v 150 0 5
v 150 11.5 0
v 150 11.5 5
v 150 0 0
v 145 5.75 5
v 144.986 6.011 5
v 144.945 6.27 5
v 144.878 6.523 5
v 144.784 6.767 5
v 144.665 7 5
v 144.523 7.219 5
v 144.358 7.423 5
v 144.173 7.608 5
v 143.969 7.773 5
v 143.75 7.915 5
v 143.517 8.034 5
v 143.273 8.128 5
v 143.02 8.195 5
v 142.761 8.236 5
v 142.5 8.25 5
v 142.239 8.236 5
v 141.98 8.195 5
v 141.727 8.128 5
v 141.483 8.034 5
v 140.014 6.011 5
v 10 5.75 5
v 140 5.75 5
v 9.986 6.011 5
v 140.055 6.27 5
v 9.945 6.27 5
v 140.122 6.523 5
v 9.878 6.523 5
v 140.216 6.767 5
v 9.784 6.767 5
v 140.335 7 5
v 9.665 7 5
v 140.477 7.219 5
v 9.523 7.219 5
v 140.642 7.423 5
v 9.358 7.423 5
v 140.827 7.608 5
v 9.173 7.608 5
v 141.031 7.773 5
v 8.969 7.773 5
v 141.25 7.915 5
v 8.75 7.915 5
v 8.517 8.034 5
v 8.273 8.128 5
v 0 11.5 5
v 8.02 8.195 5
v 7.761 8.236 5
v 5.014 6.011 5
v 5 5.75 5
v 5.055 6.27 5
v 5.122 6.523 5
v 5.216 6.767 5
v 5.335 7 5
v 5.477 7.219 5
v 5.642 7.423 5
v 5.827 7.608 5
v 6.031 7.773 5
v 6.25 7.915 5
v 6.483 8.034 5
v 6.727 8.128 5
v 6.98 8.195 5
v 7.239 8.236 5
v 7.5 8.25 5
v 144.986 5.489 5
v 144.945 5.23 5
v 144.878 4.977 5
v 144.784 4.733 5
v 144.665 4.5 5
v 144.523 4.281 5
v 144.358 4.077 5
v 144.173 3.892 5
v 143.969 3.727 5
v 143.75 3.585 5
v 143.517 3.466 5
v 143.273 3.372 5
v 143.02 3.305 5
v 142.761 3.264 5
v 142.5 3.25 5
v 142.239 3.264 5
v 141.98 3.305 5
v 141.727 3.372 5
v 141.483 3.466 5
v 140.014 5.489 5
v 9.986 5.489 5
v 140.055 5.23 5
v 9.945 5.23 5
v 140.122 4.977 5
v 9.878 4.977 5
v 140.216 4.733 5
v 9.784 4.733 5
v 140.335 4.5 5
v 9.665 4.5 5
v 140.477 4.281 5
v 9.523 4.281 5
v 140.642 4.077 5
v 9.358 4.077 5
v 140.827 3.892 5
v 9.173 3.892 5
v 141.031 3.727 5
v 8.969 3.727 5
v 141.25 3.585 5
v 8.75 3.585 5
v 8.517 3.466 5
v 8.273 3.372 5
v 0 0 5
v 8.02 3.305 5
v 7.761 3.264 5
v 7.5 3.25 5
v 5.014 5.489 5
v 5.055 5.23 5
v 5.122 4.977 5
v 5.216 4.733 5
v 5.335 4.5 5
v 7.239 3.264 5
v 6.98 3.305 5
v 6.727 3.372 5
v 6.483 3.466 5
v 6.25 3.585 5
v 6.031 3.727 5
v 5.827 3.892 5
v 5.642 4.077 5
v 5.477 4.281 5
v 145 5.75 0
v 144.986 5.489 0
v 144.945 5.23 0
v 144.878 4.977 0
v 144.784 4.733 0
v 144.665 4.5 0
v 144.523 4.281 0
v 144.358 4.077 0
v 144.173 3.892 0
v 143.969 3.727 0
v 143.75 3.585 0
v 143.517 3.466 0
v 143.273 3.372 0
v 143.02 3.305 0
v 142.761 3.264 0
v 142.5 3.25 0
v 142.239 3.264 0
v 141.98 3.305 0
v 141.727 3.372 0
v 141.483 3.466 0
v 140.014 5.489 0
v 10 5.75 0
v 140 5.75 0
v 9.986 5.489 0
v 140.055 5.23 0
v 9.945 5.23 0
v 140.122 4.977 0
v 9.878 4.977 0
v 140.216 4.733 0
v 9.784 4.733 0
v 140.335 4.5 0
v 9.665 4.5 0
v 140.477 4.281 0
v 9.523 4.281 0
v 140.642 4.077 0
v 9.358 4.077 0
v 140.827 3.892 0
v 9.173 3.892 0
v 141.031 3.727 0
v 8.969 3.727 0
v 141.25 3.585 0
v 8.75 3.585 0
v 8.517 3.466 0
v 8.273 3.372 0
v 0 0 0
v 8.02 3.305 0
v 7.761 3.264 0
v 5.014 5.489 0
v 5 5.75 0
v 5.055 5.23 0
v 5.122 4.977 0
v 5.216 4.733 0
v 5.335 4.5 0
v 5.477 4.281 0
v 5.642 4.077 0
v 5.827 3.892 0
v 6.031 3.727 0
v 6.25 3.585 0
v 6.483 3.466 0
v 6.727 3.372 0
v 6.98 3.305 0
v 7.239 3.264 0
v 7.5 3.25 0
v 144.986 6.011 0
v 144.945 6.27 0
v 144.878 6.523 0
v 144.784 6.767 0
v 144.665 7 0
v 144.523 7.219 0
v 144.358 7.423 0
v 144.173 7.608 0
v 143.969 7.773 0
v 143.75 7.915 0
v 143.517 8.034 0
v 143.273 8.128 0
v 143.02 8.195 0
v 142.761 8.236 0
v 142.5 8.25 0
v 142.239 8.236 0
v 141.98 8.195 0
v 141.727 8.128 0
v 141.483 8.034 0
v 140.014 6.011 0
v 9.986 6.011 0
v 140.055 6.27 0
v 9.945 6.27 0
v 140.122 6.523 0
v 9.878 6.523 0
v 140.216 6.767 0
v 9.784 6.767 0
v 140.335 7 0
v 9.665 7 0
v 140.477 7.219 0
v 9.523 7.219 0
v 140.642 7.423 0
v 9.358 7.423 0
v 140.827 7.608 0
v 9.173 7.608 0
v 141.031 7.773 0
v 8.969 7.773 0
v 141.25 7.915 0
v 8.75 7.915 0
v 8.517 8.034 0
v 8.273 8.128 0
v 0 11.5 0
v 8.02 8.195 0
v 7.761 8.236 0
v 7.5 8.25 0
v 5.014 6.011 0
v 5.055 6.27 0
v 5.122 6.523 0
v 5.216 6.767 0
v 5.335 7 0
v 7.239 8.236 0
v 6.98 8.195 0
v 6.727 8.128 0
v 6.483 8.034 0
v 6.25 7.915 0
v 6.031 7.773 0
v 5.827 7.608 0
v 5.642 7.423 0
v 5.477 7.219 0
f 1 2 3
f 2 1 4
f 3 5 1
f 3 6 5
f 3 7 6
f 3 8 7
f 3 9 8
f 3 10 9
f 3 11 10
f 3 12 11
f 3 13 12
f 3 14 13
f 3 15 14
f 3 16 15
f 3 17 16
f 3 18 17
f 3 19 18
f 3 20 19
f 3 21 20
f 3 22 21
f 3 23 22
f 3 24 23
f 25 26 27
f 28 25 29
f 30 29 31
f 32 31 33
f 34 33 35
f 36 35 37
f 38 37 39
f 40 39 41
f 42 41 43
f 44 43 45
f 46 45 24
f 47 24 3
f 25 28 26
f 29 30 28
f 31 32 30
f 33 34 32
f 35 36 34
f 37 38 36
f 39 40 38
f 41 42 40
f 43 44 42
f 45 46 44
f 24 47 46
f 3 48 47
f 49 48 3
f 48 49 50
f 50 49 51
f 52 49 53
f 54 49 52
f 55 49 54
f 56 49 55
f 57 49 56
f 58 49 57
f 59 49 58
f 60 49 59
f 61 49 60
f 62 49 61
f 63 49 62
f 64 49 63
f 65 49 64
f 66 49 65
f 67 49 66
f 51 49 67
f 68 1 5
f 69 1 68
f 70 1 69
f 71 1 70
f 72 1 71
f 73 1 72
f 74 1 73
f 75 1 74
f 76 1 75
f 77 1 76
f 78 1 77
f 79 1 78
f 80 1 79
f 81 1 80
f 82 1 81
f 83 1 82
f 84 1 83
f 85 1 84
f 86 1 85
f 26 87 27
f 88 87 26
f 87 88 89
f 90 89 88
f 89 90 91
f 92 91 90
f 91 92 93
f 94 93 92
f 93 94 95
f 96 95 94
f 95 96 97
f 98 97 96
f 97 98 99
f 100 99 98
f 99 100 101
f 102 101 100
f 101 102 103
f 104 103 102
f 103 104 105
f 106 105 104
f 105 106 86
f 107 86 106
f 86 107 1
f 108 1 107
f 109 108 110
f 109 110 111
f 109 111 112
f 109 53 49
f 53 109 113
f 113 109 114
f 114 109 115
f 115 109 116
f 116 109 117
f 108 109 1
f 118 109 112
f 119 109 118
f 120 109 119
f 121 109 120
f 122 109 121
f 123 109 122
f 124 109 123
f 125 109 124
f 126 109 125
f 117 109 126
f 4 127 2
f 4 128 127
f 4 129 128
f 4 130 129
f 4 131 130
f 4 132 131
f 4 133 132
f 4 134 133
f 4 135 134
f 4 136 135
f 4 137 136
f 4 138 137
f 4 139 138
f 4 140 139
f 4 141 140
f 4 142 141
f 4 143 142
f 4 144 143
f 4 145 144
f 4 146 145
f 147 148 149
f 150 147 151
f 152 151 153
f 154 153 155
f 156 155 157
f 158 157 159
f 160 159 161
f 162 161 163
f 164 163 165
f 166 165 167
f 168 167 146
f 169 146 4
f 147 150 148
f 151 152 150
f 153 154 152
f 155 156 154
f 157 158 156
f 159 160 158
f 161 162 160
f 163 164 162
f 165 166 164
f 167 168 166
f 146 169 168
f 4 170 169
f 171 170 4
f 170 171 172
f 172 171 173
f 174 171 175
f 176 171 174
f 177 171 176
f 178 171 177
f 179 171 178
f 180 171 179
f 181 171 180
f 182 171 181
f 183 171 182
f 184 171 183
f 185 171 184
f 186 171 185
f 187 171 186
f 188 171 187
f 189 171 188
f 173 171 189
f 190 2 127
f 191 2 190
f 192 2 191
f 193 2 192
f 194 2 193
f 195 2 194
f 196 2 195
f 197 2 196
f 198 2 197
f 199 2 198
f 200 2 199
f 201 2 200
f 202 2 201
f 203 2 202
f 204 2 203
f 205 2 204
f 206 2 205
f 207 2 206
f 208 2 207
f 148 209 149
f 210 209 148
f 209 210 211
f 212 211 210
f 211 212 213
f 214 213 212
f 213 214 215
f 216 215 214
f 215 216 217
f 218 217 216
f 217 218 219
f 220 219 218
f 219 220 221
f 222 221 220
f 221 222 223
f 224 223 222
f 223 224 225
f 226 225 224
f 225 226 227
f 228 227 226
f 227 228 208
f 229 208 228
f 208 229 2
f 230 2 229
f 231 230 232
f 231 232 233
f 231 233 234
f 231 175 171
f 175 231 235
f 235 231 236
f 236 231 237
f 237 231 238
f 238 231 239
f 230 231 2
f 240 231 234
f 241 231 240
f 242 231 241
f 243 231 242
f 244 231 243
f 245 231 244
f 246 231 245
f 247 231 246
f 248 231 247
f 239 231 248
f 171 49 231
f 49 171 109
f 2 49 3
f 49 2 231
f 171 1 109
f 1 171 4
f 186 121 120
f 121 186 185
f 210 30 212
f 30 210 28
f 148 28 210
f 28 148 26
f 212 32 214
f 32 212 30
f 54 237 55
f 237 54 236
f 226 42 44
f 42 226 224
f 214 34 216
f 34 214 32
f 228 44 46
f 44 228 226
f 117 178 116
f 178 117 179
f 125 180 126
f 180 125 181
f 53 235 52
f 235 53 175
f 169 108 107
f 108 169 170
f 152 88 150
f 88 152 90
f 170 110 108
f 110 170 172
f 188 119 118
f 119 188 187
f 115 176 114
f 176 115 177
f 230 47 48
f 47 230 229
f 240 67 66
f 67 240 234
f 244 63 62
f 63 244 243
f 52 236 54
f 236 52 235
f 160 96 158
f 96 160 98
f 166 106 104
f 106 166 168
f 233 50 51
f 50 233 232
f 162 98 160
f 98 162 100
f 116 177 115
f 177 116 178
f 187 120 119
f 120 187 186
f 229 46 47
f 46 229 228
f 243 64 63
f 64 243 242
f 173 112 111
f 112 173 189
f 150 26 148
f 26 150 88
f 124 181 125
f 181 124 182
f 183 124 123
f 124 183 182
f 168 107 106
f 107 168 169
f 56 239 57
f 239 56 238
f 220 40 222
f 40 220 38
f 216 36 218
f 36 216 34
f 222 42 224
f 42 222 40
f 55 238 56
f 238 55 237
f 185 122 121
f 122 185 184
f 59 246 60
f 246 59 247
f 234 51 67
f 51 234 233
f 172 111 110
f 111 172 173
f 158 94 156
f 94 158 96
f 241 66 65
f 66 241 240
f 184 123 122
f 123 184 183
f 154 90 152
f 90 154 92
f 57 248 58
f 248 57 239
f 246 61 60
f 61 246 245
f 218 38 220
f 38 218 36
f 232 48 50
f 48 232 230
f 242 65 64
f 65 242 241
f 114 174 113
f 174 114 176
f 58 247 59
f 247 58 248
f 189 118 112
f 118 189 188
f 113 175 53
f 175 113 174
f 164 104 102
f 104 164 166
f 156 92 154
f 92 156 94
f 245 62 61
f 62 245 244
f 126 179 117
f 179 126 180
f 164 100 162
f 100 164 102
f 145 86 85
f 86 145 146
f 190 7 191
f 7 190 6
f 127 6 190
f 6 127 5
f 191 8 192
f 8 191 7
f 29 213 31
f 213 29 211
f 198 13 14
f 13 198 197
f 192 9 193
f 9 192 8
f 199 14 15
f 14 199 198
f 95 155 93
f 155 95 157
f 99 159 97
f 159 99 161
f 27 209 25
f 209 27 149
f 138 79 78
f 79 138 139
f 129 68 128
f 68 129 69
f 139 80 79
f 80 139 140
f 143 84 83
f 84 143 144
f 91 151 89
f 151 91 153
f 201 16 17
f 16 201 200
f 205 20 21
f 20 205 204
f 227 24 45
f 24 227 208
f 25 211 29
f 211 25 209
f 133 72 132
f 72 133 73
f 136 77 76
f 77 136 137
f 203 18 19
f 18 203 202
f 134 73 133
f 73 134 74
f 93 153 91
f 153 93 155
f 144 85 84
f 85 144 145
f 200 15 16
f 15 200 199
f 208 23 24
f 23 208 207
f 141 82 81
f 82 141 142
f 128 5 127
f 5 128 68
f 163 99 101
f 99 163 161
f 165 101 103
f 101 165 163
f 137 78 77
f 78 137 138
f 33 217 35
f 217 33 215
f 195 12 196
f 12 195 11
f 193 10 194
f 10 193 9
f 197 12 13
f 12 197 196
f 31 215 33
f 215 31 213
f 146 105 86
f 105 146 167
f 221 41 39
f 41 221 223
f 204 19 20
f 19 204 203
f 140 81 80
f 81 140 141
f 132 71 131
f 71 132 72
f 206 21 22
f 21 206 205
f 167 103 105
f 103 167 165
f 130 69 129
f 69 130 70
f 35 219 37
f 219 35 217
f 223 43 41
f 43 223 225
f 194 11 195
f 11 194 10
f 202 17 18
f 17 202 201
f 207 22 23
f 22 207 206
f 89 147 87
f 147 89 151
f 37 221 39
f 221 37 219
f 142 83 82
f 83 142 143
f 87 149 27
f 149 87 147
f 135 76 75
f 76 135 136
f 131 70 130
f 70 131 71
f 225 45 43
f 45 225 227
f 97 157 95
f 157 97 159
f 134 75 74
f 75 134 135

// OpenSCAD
$fn = 60;
cut_margin = 5;

hole_distance = 135;

part_length = 150;
x = part_length;

part_width = 11.5;
y = part_width;

part_thickness = 5;
z = part_thickness;

hole_offset = (x-hole_distance)/2;

module hole() {
       cylinder(d=5, h=50);       
}

module vert_static_ligament() {
       difference() {
        color([0,0,0.8]) cube([x,y,z]);
        translate([hole_offset,y/2,-cut_margin]) hole();
        translate([hole_distance+hole_offset,y/2,-cut_margin]) hole();
       }
}

vert_static_ligament();
